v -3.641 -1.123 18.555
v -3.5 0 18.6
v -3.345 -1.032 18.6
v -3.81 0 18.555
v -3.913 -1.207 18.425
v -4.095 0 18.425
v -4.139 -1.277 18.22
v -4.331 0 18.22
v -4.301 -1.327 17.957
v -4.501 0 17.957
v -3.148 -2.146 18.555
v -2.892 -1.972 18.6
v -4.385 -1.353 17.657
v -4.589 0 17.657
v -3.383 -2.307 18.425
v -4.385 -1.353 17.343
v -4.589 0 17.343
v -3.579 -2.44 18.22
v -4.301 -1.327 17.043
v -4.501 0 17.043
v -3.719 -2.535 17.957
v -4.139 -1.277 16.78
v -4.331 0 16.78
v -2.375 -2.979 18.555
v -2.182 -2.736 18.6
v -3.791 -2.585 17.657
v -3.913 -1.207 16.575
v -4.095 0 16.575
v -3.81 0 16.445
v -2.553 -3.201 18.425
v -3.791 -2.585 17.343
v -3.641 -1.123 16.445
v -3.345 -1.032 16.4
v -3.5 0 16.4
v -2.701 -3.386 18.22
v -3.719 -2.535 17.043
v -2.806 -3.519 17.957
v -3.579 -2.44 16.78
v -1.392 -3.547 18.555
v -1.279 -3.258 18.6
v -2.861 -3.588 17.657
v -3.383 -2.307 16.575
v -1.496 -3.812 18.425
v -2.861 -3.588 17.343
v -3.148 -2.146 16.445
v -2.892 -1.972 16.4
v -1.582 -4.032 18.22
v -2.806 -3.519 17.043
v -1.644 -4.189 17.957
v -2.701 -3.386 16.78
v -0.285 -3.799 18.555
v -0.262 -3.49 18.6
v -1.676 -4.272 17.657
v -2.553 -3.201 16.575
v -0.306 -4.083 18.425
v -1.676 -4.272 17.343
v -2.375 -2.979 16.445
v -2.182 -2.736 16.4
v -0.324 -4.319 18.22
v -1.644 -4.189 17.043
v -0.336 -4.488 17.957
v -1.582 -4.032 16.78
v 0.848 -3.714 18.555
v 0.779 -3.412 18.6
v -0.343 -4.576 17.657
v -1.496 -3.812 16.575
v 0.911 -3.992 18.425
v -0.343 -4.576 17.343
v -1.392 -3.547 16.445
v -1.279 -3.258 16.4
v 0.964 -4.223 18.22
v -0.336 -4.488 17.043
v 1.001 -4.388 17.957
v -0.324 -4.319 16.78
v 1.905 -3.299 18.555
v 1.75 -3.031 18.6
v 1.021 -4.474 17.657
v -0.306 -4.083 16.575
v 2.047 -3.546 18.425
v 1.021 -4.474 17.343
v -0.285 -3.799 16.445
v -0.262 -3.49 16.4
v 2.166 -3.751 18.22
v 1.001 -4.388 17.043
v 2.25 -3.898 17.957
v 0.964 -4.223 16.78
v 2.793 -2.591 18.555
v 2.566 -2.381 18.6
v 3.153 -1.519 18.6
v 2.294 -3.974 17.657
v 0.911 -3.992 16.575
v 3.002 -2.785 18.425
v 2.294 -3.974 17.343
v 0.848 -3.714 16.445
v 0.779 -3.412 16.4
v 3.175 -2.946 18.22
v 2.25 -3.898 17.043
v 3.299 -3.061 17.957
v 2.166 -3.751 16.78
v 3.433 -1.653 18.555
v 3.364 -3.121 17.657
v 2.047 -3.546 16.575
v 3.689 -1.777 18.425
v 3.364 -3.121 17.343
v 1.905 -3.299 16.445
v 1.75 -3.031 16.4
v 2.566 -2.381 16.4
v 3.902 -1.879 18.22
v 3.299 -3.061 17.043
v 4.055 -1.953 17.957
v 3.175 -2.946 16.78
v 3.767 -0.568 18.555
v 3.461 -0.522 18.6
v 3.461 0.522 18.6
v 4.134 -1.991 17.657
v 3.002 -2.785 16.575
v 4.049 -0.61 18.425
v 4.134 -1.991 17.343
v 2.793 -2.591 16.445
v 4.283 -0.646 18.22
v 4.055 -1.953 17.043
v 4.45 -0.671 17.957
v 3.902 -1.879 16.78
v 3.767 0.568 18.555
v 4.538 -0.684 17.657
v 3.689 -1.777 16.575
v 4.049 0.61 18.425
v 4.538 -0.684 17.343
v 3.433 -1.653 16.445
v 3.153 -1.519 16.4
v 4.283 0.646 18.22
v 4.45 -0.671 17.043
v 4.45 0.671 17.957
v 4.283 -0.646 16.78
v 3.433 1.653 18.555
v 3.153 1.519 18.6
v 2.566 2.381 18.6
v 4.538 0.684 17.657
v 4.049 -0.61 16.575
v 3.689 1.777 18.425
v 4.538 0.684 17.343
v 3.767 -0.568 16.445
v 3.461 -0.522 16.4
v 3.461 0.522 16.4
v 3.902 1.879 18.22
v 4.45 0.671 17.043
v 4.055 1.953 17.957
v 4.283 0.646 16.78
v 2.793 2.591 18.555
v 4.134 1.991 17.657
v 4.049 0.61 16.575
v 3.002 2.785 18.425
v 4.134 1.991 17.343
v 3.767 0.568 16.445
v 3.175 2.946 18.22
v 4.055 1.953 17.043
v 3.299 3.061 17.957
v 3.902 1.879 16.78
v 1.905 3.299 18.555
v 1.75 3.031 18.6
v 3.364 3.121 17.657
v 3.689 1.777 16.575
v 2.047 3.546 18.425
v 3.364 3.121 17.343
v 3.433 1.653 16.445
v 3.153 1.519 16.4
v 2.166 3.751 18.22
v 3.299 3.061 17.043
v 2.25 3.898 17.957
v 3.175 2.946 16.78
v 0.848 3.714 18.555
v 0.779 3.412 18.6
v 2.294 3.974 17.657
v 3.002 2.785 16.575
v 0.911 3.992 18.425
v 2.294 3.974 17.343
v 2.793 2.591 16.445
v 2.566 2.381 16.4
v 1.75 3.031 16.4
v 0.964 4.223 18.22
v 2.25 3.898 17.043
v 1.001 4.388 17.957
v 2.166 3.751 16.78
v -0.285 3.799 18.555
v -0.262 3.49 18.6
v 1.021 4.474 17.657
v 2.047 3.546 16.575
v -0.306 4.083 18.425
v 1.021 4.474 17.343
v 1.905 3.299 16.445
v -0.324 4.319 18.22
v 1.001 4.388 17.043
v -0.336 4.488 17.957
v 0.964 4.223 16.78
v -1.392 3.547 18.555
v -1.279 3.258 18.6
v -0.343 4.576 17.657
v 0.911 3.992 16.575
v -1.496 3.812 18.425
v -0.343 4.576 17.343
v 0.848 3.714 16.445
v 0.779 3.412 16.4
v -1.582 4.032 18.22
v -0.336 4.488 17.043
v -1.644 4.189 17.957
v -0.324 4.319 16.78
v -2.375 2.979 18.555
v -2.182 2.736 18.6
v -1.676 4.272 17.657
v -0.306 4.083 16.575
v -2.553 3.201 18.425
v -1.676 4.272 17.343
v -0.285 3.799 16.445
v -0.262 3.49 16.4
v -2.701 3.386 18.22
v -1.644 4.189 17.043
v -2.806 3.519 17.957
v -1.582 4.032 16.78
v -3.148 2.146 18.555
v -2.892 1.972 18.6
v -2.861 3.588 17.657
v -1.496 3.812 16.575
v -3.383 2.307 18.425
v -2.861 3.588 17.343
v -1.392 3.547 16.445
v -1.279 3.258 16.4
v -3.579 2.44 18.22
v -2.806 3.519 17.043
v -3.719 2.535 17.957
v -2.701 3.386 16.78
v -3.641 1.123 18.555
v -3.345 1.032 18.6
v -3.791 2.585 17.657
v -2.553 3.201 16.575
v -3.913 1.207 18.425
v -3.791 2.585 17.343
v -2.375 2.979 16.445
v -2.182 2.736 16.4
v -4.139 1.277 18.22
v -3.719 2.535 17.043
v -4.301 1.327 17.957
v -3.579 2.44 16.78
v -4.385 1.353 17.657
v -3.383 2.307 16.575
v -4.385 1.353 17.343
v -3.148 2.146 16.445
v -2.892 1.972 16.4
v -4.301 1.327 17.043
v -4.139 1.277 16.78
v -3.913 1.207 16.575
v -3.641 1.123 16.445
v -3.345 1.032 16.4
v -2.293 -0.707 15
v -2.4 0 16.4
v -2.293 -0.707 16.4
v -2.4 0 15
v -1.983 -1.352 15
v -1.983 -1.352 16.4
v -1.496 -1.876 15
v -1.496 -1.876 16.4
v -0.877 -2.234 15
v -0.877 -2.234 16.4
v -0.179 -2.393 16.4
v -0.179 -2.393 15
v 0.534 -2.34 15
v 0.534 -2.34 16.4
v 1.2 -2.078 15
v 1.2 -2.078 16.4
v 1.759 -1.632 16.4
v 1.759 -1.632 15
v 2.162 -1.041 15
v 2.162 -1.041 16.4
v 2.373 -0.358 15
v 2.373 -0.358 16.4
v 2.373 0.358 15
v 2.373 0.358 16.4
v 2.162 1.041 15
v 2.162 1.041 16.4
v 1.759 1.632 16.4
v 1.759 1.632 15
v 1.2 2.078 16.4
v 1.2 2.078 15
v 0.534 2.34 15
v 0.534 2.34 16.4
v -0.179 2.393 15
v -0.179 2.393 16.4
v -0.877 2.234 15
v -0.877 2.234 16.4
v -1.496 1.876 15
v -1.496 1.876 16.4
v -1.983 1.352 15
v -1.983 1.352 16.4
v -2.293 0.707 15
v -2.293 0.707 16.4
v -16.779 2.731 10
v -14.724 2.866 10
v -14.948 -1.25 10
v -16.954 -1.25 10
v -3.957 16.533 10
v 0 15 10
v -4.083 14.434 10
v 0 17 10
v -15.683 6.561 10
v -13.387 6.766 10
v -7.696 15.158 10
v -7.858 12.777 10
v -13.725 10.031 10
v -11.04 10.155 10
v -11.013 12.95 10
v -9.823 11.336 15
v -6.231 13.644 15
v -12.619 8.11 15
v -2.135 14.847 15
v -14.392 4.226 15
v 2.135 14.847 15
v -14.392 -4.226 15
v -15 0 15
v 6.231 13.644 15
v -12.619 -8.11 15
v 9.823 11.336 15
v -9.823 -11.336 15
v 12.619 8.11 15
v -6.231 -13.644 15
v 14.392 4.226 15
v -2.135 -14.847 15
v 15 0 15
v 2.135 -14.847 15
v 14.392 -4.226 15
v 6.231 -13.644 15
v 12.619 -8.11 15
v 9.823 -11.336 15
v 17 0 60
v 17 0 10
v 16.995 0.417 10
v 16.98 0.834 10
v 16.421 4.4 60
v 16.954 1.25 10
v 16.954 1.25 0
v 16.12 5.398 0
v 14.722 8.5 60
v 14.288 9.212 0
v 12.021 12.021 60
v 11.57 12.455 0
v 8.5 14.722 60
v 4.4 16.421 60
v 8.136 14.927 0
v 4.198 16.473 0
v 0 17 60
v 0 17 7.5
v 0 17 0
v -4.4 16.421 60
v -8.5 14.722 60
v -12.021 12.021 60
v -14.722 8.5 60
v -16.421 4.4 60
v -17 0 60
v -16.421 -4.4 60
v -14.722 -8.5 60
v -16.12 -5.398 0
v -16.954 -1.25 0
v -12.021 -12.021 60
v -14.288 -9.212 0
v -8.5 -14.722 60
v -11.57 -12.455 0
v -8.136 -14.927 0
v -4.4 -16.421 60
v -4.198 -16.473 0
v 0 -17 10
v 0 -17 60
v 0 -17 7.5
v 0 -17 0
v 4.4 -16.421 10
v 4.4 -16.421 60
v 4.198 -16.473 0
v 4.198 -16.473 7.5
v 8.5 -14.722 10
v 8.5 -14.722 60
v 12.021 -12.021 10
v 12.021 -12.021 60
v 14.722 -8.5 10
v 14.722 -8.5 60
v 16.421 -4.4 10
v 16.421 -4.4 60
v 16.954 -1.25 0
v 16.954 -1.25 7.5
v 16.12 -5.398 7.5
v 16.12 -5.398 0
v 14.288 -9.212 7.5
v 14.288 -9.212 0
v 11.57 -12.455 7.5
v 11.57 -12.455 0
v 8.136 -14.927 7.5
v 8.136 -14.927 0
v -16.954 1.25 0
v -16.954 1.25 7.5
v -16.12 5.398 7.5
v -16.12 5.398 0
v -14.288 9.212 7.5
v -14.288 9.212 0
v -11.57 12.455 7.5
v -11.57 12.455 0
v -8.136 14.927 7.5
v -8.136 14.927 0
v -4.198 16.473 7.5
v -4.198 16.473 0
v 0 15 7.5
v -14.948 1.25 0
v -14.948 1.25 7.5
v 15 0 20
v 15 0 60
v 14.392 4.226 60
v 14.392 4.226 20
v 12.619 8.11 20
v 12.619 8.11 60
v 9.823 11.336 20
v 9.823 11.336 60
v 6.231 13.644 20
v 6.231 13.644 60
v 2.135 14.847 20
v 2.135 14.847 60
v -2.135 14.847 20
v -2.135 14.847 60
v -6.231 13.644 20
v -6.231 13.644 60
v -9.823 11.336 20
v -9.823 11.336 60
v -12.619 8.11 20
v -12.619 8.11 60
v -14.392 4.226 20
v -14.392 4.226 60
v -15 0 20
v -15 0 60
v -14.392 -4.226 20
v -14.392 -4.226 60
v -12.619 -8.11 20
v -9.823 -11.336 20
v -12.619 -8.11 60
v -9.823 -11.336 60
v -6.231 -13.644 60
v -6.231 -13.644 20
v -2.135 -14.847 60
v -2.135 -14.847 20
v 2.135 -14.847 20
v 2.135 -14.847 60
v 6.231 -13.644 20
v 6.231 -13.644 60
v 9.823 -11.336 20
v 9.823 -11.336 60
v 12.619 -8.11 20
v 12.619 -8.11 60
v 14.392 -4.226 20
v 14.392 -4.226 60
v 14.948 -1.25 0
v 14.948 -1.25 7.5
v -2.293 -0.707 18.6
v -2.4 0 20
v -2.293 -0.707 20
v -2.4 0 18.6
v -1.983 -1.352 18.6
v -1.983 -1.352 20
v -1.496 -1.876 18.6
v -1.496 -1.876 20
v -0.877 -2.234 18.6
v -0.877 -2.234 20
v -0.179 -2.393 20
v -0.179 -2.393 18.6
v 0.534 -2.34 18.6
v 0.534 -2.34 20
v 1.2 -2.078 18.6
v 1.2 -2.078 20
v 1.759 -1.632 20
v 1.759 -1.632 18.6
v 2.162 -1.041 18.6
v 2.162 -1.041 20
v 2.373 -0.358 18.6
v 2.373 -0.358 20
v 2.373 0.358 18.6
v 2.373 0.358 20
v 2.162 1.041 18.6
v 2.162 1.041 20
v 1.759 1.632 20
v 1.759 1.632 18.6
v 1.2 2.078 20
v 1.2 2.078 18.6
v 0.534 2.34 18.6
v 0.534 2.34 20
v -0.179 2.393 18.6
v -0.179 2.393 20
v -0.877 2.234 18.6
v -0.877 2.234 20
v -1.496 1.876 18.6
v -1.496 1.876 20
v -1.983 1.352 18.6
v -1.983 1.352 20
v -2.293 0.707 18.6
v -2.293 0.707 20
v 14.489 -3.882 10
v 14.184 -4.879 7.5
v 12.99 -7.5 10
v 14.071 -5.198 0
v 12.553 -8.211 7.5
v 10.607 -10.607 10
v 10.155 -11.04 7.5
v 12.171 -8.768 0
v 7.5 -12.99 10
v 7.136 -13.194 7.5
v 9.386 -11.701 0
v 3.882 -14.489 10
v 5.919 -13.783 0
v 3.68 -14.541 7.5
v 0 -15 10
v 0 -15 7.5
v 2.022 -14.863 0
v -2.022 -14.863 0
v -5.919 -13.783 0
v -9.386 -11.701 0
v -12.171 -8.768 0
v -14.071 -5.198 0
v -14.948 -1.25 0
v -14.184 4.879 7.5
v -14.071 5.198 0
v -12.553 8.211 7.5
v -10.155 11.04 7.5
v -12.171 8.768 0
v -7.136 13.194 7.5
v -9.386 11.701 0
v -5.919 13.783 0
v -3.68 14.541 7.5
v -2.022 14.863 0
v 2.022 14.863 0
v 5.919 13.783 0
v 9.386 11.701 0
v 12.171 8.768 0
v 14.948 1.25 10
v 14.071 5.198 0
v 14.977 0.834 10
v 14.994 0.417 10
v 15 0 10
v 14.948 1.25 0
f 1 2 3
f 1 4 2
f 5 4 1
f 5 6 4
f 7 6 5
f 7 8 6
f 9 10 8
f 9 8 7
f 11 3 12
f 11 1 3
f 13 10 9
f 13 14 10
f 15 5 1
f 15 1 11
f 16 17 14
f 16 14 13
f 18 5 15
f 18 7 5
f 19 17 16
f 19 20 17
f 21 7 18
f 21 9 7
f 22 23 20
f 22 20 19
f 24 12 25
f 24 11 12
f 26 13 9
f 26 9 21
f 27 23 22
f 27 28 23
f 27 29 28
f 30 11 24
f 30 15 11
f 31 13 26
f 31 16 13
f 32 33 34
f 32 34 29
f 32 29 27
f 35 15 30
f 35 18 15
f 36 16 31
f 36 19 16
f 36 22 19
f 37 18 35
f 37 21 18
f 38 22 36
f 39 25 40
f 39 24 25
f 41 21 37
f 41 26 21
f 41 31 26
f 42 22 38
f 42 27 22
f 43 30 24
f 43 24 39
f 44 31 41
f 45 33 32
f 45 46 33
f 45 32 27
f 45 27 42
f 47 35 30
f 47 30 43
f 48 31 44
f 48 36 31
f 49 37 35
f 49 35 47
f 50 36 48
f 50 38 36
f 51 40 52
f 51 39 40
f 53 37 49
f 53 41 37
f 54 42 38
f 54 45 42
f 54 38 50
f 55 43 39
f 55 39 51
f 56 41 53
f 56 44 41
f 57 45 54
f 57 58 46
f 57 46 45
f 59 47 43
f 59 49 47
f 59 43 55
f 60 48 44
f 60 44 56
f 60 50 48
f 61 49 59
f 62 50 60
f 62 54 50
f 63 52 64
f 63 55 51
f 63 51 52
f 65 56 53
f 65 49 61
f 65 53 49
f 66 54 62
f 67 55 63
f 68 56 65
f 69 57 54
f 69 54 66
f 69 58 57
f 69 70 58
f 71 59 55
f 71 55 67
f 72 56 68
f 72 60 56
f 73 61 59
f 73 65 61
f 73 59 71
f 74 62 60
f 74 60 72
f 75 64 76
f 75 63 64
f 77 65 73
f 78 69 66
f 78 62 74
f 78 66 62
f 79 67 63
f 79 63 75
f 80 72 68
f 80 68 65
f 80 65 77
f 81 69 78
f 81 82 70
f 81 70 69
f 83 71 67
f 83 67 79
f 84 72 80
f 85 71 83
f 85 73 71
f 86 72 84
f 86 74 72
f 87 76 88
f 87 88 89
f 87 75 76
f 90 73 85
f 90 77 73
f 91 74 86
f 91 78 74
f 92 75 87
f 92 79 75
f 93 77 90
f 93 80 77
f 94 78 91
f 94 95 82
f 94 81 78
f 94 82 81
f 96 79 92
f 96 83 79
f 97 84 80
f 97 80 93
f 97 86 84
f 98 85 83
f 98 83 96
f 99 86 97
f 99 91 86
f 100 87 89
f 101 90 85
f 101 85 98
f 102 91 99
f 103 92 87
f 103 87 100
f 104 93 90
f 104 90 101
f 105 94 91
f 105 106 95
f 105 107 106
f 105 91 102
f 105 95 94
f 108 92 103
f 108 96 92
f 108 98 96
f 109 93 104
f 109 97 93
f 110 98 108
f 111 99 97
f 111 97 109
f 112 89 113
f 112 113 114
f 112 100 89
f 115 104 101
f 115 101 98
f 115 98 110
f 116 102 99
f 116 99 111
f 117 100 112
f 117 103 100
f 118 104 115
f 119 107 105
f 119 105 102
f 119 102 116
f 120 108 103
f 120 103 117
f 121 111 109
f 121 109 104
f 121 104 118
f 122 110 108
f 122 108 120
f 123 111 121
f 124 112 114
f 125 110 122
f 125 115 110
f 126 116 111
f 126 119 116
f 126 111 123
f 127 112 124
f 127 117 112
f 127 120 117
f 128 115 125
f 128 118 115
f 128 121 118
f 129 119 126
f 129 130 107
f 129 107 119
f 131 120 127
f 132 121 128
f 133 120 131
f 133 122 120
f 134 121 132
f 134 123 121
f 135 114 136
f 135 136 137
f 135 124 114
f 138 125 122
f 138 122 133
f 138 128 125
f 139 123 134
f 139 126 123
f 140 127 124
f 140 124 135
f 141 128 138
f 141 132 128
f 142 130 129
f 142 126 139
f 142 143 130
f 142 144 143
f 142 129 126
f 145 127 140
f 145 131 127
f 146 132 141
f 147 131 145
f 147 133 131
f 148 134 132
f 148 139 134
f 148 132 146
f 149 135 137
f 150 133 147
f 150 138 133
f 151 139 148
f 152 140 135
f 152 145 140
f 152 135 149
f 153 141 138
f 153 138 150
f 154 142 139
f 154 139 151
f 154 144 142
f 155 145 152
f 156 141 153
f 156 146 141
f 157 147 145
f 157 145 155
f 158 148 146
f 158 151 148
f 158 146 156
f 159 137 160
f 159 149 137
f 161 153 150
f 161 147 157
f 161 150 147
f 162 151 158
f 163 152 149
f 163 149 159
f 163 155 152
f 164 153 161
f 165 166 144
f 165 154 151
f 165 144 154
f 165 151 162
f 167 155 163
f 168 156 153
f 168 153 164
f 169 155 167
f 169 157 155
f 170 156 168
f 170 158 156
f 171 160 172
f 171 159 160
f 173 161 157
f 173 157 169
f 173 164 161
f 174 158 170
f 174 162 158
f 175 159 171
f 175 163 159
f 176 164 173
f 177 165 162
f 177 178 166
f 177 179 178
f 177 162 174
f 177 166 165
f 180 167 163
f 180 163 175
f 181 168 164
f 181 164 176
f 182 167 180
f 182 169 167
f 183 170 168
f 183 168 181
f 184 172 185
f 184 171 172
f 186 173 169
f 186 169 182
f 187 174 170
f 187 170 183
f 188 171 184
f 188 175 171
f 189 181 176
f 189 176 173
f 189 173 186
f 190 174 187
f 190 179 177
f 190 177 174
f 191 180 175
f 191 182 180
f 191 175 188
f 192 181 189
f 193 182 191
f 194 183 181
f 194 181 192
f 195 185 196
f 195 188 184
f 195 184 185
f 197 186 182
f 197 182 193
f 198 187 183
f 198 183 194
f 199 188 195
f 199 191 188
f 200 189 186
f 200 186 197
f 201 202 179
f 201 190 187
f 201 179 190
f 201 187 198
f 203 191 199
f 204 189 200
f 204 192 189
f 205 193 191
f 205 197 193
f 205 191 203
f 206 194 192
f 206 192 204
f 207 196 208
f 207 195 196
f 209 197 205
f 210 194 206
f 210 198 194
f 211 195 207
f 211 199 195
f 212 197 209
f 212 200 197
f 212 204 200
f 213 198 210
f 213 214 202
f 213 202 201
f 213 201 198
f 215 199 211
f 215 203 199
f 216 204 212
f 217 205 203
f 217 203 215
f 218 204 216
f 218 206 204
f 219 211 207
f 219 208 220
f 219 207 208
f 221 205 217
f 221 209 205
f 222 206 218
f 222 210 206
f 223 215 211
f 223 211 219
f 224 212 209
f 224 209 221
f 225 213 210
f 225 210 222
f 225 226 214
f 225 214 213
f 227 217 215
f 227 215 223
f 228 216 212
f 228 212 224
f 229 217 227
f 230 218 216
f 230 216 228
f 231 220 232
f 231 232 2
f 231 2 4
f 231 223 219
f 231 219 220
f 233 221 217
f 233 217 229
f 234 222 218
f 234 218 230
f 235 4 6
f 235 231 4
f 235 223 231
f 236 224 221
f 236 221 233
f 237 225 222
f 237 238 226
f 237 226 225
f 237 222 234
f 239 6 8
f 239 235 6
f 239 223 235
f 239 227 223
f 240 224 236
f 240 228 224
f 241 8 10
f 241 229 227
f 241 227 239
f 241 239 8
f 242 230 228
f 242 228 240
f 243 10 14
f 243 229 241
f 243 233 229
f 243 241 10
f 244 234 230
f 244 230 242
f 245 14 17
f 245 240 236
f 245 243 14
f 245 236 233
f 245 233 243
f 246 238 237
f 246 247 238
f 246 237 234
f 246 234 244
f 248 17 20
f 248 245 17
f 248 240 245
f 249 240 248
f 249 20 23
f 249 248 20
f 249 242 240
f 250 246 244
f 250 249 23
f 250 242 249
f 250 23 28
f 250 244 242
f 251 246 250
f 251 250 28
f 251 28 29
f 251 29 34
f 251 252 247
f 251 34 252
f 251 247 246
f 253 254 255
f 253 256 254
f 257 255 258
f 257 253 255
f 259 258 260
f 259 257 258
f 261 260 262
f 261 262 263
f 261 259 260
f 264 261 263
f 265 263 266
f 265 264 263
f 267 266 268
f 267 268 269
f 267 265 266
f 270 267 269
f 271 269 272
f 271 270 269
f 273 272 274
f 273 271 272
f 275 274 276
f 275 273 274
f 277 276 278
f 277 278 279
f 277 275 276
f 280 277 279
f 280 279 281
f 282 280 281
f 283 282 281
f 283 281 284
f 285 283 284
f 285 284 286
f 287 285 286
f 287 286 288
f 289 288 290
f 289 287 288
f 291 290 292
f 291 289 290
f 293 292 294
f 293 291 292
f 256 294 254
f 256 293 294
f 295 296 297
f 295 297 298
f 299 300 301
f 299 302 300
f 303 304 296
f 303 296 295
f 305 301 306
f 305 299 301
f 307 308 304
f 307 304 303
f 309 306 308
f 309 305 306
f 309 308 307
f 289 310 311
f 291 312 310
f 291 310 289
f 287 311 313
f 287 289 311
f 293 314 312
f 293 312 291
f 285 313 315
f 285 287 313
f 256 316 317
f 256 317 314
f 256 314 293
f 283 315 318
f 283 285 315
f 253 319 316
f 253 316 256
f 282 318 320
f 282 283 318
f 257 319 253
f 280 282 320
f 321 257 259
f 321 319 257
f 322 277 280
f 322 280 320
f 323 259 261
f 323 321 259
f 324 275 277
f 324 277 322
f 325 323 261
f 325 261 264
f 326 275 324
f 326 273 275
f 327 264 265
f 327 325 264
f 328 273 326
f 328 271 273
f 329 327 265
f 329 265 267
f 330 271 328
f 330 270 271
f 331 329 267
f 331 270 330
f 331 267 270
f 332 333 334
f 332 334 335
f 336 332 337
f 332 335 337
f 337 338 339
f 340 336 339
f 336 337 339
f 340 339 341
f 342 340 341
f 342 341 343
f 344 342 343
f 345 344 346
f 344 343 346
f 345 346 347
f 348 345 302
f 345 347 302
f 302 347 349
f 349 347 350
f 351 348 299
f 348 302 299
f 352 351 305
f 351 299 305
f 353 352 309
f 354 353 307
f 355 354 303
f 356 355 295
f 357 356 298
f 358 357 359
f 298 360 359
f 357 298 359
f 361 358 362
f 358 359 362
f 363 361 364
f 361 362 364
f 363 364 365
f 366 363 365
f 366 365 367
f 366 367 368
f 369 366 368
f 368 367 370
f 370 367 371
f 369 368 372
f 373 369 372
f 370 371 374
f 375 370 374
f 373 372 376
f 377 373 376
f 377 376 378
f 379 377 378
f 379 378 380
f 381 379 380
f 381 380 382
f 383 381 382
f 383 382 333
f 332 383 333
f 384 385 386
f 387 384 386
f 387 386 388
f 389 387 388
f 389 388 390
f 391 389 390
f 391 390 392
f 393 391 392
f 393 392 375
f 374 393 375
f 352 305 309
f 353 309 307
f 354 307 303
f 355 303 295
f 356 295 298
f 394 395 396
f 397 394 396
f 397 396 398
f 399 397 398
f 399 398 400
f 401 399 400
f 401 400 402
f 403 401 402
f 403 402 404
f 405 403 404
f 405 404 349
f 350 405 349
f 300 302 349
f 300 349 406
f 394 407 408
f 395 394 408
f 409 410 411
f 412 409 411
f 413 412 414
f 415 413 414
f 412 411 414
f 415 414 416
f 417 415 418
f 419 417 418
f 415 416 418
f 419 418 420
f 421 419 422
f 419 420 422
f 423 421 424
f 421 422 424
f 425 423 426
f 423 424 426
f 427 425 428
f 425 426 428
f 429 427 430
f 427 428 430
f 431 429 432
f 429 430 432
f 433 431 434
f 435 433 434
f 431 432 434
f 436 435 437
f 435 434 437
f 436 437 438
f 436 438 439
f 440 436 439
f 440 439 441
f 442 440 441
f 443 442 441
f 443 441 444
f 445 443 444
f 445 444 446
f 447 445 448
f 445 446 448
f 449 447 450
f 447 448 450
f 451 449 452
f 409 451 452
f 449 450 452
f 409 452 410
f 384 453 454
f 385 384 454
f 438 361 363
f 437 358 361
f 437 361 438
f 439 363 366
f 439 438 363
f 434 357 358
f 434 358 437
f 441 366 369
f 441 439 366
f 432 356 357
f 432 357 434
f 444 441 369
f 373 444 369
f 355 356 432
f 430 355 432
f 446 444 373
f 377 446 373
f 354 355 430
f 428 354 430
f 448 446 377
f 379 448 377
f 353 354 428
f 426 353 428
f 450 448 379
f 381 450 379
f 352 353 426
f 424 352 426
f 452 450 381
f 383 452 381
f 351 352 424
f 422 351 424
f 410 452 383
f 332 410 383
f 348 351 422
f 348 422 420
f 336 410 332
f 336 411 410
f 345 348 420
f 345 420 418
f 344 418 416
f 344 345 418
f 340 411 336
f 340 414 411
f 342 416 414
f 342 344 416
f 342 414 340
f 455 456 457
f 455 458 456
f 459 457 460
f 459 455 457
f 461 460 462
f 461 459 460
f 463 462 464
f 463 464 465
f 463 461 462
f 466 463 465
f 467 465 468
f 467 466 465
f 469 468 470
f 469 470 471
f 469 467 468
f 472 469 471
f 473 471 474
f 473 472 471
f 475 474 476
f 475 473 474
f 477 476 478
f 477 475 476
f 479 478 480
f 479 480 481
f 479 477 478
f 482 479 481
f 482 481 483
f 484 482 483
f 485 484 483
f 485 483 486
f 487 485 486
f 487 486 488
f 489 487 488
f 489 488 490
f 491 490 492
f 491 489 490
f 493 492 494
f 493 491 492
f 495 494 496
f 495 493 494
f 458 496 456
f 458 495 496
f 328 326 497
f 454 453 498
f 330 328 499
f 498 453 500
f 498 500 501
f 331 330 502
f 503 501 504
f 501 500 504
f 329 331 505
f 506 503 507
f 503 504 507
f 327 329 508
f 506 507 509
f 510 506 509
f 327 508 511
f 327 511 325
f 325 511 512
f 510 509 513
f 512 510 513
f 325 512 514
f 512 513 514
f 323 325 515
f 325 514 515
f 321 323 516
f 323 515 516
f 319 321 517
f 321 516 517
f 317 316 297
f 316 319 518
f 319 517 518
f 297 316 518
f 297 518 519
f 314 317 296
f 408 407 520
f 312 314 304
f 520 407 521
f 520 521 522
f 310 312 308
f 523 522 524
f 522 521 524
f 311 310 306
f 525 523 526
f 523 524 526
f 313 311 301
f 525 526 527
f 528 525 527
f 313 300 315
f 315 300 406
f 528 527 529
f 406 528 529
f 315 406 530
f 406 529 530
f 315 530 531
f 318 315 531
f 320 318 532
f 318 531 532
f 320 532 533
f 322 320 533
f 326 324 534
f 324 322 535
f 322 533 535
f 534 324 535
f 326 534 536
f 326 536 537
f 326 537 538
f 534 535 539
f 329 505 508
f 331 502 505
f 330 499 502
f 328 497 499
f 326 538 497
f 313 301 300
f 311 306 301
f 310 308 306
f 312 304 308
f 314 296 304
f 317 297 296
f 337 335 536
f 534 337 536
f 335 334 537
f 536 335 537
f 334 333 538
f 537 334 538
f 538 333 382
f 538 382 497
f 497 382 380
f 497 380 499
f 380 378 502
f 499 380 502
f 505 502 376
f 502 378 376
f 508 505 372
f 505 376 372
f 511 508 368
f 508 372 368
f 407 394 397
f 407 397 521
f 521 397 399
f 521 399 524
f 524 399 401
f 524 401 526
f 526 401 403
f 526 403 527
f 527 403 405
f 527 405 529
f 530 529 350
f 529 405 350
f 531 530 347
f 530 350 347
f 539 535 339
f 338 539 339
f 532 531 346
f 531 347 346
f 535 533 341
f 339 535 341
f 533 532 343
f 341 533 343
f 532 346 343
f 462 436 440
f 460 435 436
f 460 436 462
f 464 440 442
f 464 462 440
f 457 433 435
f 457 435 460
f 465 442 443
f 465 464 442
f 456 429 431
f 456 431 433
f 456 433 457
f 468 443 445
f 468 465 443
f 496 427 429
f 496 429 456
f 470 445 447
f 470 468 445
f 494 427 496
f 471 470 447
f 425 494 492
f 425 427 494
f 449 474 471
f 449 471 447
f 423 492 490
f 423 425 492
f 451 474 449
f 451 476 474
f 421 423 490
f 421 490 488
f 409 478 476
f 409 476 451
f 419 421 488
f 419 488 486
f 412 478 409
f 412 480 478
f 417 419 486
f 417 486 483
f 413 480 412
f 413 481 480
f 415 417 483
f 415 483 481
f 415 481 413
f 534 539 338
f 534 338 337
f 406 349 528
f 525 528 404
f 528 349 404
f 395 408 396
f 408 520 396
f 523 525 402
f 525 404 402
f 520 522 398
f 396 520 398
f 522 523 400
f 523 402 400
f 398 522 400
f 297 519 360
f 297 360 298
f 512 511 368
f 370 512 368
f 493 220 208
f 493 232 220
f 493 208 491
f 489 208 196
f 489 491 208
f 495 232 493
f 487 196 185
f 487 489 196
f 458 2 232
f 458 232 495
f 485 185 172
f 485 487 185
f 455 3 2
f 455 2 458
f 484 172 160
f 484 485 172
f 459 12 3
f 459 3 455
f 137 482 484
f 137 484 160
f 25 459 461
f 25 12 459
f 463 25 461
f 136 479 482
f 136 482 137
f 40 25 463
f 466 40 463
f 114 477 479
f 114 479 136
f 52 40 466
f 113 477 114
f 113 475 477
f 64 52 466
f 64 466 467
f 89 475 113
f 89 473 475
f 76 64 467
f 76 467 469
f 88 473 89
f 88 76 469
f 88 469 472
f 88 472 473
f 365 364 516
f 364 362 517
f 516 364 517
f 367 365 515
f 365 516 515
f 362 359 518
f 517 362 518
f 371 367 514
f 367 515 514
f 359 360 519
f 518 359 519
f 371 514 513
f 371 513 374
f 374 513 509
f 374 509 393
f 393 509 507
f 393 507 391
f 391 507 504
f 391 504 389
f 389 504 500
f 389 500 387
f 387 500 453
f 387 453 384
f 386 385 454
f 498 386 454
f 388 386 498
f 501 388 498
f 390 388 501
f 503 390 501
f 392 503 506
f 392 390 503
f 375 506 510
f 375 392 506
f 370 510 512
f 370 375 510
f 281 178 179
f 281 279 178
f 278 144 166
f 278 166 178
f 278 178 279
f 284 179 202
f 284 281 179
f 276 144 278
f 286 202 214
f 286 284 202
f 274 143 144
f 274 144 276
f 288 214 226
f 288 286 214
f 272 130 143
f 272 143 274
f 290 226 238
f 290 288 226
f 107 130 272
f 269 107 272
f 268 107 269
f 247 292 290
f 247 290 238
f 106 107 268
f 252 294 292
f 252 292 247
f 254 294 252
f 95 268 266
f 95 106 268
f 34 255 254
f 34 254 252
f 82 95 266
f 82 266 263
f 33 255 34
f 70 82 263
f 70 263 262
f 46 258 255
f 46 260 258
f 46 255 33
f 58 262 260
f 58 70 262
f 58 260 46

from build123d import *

# Parameters (mm, degrees)
F0_R          = 17
F1_DEPTH      = 60
F2_R          = 15
F3_DEPTH      = 40
F4_R          = 15
F5_DEPTH      = 15
F6_W          = 2.5
F6_H          = 10
F7_DEPTH      = 18
F7_DEPTH_BACK = 18
F8_W          = 17
F8_H          = 2.5
F10_ANGLE     = 90
F11_W         = 17
F11_H         = 2.5
F12_ANGLE     = 90


with BuildPart() as f1:
    # F0 (on Top) → F1 (new body)
    with BuildSketch(Plane.XY):
        Circle(F0_R)
    extrude(amount=F1_DEPTH)

    # F2 (on face) → F3 (cut)
    with BuildSketch(Plane.XY.offset(60)):
        Circle(F2_R)
    extrude(amount=-F3_DEPTH, mode=Mode.SUBTRACT)

    # F4 (on face) → F5 (cut)
    with BuildSketch(Plane(origin=(0, 0, 0), x_dir=(1, 0, 0), z_dir=(0, 0, -1))):
        Circle(F4_R)
    extrude(amount=-F5_DEPTH, mode=Mode.SUBTRACT)

    # F6 (on Right) → F7 (cut, two sides)
    with BuildSketch(Plane.YZ) as f7_sk:
        with Locations((0, 5)):
            Rectangle(F6_W, F6_H)
    extrude(amount=F7_DEPTH, mode=Mode.SUBTRACT)
    extrude(f7_sk.sketch, amount=-F7_DEPTH_BACK, mode=Mode.SUBTRACT)

    # F8 (on Front) → F10 (revolve, cut)
    with BuildSketch(Plane.XZ):
        with Locations((-8.5, 8.75)):
            Rectangle(F8_W, F8_H)
    revolve(axis=Axis((0, 0, 15.6492851675), (0, 0, -1)), revolution_arc=F10_ANGLE, mode=Mode.SUBTRACT)

    # F11 (on Front) → F12 (revolve, cut)
    with BuildSketch(Plane.XZ):
        with Locations((8.5, 8.75)):
            Rectangle(F11_W, F11_H)
    revolve(axis=Axis((0, 0, 6.5289476479), (0, 0, -1)), revolution_arc=F12_ANGLE, mode=Mode.SUBTRACT)

    # F13 (on Front) → F14 (revolve, cut)
    with BuildSketch(Plane.XZ):
        with BuildLine():
            Line((-2.4, 15), (0, 15))
            Line((0, 15), (0, 20))
            Line((0, 20), (-2.4, 20))
            Line((-2.4, 20), (-2.4, 18.6))
            Line((-2.4, 18.6), (-3.5, 18.6))
            ThreePointArc((-3.5, 18.6), (-4.6, 17.5), (-3.5, 16.4))
            Line((-3.5, 16.4), (-2.4, 16.4))
            Line((-2.4, 16.4), (-2.4, 15))
        make_face()
    revolve(axis=Axis((0, 0, 17.5), (0, 0, 1)), mode=Mode.SUBTRACT)


solid = f1.part
